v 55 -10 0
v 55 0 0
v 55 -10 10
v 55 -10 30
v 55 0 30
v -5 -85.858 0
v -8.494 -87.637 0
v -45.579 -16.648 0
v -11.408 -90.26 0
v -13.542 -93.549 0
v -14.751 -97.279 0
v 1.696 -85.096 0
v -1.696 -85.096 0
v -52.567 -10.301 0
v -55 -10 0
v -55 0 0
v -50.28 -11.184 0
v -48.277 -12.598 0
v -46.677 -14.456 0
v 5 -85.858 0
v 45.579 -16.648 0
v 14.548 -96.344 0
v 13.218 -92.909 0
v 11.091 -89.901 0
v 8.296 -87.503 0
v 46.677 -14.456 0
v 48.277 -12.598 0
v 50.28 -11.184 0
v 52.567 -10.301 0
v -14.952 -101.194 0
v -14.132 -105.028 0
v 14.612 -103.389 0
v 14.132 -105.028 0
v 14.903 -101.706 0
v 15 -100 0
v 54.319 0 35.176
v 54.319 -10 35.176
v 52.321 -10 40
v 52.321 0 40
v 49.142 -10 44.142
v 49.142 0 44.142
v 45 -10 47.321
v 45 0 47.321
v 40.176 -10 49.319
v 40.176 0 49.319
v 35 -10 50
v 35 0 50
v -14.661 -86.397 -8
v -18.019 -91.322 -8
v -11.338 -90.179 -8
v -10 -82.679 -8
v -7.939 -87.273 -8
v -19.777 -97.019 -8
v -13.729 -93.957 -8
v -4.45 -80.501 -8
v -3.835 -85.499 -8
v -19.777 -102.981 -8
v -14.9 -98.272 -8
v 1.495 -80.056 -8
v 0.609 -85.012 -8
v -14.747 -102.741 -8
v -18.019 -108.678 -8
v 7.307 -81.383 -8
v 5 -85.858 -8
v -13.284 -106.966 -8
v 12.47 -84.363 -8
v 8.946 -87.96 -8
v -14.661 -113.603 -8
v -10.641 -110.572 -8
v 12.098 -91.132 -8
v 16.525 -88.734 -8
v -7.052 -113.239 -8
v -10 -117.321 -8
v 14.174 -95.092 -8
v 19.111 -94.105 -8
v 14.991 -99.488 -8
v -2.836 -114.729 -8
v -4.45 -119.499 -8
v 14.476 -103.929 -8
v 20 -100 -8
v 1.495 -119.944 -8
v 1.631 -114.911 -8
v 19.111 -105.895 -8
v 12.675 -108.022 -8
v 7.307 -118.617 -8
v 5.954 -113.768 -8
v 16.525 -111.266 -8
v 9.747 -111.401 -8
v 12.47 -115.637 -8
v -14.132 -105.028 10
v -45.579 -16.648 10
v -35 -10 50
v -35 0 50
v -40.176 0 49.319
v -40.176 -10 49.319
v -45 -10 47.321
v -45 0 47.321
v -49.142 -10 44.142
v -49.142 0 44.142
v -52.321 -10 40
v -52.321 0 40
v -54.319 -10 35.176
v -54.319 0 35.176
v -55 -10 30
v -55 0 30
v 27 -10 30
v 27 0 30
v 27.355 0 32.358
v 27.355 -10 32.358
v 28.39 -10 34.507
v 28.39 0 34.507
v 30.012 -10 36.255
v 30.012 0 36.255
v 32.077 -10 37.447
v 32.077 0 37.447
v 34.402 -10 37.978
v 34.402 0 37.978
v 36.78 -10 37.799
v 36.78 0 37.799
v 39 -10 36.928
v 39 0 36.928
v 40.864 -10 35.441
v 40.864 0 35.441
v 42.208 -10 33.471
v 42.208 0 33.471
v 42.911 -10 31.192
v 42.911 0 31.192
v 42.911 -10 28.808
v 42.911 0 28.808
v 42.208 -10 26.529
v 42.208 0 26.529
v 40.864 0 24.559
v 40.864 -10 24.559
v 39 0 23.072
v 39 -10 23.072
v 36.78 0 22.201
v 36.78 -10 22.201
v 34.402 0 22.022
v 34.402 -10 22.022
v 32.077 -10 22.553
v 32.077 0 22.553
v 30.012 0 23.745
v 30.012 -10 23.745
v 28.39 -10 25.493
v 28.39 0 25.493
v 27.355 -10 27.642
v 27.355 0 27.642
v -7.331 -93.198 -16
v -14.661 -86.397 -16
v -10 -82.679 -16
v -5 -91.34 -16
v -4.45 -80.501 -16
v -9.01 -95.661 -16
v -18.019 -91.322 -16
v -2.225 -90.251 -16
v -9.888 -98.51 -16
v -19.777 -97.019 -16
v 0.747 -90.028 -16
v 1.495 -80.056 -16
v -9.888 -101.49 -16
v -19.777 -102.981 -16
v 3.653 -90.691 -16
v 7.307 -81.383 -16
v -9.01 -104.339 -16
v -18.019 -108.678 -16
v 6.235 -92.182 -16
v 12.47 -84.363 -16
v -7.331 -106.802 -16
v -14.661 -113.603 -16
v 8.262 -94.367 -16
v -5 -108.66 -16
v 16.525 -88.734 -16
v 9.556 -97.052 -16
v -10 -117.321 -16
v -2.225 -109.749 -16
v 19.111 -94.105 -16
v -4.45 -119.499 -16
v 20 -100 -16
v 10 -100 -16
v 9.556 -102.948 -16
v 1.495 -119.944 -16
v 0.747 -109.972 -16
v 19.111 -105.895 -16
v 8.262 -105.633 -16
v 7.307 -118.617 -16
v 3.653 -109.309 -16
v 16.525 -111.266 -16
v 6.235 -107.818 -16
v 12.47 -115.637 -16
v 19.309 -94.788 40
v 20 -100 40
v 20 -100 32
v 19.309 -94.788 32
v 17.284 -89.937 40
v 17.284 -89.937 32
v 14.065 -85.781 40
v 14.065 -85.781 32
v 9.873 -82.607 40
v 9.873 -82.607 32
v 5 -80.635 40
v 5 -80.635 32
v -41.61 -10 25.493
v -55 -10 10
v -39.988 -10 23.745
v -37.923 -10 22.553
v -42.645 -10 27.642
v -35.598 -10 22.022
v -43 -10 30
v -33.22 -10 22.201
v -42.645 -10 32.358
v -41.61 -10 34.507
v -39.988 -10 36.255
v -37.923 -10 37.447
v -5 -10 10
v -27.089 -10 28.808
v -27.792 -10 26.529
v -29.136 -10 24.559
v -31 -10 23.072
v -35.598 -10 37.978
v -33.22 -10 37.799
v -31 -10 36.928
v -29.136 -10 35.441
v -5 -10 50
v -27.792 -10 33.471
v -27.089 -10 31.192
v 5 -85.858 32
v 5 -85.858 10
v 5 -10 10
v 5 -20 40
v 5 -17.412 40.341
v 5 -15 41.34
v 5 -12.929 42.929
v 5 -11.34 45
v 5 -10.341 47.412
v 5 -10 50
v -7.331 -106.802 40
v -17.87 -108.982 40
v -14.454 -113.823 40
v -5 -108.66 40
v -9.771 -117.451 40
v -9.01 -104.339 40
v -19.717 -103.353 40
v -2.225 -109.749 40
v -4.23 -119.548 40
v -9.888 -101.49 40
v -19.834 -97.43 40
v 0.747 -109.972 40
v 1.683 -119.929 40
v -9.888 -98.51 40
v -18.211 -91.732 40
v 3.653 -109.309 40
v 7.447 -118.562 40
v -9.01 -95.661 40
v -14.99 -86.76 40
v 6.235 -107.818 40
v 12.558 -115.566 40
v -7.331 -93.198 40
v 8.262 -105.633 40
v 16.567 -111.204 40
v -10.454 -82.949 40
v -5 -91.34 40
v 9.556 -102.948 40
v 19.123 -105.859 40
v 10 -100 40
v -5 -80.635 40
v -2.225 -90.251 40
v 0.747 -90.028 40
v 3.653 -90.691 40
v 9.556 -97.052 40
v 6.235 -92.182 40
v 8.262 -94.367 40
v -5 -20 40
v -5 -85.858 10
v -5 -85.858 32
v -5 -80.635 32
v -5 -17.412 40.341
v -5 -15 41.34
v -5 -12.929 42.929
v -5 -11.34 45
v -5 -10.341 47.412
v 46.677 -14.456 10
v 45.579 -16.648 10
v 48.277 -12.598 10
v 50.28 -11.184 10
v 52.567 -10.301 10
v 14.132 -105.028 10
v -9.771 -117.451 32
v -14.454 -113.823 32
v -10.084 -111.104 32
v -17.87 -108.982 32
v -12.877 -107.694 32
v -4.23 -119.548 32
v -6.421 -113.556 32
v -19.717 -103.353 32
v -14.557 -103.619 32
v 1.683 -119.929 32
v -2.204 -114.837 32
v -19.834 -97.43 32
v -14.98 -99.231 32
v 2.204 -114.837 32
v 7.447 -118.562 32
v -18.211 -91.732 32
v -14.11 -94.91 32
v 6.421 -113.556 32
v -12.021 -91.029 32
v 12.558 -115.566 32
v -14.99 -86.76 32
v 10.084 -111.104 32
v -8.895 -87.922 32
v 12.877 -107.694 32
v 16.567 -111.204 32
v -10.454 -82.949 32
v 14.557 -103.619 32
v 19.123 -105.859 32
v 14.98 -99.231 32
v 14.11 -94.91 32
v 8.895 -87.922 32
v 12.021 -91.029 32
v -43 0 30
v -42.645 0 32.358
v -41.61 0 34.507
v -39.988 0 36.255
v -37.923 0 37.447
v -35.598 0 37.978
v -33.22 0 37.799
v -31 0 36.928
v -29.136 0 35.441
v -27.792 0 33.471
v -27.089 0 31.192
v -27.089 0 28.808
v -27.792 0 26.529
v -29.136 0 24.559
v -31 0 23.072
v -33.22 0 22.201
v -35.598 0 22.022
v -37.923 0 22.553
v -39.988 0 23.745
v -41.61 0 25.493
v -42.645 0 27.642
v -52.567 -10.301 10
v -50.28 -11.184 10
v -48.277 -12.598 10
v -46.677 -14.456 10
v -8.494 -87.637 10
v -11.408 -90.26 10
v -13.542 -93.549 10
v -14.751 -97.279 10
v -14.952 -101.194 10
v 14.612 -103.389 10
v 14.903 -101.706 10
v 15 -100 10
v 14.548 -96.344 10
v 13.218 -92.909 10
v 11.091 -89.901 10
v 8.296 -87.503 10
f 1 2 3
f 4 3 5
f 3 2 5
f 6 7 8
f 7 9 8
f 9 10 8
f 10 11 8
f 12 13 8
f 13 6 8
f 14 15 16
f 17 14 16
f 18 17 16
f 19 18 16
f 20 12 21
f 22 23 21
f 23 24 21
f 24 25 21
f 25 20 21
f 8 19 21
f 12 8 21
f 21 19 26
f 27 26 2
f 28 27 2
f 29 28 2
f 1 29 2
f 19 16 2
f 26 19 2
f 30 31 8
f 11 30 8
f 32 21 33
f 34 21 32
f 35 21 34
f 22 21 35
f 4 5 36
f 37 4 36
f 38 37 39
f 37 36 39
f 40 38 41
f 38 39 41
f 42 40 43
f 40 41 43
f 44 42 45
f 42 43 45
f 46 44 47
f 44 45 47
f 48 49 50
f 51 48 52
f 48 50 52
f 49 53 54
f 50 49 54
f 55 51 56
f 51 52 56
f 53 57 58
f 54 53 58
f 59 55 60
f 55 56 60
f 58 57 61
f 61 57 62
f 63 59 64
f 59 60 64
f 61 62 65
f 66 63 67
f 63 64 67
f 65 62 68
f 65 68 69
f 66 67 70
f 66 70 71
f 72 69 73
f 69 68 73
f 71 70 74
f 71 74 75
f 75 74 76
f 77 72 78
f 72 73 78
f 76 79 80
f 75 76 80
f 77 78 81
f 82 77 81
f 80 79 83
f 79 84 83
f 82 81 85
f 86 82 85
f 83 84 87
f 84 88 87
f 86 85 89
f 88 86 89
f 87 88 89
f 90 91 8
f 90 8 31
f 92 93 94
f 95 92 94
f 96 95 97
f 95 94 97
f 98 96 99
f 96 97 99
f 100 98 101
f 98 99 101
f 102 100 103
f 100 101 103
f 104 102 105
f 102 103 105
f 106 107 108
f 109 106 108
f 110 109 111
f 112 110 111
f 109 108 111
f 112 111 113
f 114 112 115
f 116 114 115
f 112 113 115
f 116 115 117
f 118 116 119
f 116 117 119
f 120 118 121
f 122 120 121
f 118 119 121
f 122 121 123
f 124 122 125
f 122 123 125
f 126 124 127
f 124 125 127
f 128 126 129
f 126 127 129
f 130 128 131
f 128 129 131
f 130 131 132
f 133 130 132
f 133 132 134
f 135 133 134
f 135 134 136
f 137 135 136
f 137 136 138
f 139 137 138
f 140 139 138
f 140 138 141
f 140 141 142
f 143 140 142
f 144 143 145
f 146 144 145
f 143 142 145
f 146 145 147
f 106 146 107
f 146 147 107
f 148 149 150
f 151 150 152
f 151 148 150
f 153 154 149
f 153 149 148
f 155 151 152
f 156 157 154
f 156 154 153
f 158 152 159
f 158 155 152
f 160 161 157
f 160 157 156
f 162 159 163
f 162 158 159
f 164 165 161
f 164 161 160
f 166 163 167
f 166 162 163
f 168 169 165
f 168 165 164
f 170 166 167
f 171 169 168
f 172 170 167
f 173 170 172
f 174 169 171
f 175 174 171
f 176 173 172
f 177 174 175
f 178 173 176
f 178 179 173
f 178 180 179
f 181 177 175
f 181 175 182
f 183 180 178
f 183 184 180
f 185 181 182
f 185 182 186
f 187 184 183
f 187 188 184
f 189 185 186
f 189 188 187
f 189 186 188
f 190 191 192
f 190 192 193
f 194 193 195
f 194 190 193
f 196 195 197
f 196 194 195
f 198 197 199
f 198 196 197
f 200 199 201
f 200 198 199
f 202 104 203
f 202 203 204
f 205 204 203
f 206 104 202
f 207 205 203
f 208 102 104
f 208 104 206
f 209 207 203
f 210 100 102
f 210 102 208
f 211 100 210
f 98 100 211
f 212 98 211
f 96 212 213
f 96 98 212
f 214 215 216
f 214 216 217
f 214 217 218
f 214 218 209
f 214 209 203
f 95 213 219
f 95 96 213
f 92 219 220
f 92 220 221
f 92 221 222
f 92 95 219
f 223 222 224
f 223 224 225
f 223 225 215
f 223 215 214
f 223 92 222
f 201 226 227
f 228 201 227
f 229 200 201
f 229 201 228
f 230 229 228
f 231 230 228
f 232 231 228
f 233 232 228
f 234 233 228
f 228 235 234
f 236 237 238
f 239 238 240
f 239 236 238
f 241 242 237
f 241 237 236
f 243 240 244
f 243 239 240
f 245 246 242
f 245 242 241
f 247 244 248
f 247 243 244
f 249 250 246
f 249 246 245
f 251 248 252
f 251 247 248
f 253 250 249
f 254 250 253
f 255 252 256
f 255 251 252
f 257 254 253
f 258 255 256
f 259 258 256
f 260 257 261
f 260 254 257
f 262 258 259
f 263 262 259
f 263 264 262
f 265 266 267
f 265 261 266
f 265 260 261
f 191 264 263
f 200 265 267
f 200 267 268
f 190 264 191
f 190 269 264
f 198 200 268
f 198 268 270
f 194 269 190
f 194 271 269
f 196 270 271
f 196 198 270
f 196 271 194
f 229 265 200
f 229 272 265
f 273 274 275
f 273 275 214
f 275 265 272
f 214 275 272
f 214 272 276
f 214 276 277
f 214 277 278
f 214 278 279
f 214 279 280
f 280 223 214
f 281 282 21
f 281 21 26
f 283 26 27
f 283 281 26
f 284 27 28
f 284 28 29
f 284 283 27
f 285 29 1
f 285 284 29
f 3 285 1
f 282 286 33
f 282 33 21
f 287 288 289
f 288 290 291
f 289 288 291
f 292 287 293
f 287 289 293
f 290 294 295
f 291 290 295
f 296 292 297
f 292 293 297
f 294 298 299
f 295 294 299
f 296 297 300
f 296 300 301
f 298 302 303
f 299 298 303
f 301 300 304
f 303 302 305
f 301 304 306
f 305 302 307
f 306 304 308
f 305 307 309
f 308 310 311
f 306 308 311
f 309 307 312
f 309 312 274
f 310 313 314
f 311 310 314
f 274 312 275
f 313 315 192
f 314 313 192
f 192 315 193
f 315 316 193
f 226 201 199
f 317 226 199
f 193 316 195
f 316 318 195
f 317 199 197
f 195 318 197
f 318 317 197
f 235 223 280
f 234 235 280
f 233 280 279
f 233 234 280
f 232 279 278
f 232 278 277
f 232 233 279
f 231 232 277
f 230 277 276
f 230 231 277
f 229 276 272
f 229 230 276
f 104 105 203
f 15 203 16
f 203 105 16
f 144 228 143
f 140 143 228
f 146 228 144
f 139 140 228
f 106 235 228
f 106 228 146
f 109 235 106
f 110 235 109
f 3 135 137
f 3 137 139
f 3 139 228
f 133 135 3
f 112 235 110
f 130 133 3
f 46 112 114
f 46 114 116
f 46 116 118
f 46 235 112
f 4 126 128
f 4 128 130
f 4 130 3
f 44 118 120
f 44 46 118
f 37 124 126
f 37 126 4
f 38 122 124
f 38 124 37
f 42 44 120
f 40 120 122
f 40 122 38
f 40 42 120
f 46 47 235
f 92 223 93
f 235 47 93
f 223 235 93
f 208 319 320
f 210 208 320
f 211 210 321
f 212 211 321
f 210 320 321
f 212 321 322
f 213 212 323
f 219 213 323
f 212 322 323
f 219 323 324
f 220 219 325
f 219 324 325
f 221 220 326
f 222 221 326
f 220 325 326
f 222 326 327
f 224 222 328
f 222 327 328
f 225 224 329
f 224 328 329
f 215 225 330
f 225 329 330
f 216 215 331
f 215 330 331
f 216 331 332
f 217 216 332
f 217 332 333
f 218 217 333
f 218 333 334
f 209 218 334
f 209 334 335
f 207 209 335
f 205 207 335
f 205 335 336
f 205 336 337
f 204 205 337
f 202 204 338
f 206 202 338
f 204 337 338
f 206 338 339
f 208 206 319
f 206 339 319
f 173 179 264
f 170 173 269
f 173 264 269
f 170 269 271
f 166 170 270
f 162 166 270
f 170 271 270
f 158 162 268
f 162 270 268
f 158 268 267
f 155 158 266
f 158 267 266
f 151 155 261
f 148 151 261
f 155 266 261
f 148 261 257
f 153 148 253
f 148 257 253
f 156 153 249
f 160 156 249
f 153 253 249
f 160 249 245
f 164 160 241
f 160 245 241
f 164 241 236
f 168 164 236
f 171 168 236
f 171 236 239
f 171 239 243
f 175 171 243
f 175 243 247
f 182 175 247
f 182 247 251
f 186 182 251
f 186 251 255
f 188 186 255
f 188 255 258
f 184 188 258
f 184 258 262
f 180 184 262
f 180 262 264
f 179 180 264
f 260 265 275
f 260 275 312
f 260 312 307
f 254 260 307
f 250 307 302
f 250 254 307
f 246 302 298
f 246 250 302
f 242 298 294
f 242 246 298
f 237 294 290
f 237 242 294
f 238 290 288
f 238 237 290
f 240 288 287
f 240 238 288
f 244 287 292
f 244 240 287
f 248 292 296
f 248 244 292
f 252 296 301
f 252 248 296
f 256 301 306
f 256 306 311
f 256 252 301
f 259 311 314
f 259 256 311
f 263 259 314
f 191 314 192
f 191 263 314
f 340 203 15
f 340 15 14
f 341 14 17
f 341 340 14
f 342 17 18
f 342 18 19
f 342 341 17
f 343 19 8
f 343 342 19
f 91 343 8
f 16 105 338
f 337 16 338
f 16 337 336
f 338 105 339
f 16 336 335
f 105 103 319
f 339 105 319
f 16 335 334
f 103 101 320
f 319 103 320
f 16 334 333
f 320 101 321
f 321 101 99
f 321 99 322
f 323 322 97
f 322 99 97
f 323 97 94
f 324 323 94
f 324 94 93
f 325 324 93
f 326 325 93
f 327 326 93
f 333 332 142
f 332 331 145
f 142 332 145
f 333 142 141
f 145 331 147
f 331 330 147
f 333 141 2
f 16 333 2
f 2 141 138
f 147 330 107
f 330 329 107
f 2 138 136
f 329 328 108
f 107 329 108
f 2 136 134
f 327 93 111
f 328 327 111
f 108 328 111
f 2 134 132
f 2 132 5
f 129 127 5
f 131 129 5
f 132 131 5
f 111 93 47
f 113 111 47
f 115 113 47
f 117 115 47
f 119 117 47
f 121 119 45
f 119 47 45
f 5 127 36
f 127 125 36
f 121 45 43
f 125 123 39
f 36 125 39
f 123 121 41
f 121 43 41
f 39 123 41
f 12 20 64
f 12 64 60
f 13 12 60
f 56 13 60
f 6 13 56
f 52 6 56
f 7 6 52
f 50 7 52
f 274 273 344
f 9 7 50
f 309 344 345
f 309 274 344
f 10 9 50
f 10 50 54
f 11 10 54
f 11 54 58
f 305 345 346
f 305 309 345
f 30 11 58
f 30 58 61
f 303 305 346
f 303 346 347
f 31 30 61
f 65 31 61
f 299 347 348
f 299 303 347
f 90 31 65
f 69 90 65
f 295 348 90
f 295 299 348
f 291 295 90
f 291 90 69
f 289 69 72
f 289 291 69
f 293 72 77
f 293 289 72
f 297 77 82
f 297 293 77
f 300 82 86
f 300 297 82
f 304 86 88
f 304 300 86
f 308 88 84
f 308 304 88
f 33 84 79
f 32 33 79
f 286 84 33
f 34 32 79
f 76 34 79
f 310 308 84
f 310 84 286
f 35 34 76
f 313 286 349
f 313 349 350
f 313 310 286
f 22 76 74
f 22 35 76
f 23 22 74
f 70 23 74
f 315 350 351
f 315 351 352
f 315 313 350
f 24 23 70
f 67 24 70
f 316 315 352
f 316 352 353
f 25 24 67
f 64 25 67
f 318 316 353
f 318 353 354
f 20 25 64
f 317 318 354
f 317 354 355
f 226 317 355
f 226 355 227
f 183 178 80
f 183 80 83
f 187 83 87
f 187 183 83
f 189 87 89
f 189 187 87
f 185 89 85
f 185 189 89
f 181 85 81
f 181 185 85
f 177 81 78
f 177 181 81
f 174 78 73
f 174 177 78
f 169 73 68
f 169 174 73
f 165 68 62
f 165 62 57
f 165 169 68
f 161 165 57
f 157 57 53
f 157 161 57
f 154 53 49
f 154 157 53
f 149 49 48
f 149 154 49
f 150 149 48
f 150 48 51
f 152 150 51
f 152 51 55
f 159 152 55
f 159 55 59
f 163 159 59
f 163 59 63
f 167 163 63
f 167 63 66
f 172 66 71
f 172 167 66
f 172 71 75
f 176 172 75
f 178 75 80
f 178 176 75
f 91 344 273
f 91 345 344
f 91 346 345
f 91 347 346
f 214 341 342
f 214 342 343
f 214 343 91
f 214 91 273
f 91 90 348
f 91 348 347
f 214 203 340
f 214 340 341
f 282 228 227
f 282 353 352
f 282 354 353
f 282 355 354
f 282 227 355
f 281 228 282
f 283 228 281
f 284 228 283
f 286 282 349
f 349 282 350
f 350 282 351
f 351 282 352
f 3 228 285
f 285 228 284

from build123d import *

# Parameters (mm, degrees)
F1_DEPTH  = 10
F4_DEPTH  = 10
F6_DEPTH  = 5
F8_DEPTH  = 56
F10_DEPTH = 8
F11_R     = 20
F11_R_2   = 15
F12_DEPTH = 8
F13_R     = 10
F14_DEPTH = 56.001
F15_R     = 8
F16_DEPTH = 10


with BuildPart() as f1:
    # F0 (on Front) → F1 (new body)
    with BuildSketch(Plane.XZ):
        with BuildLine():
            Line((-55, 30), (-55, 0))
            Line((-55, 0), (55, 0))
            Line((55, 0), (55, 30))
            ThreePointArc((55, 30), (49.1421356237, 44.1421356237), (35, 50))
            Line((35, 50), (-35, 50))
            ThreePointArc((-35, 50), (-49.1421356237, 44.1421356237), (-55, 30))
        make_face()
    extrude(amount=F1_DEPTH)

    # F3 (on offset) → F4 (join)
    with BuildSketch(Plane.XY.offset(10)):
        with BuildLine():
            Line((-15.9212083525, -100), (-14.1320931815, -105.0283140623))
            ThreePointArc((-14.1320931815, -105.0283140623), (0, -115), (14.1320931815, -105.0283140623))
            Line((14.1320931815, -105.0283140623), (15.9212083525, -100))
            Line((15.9212083525, -100), (45.5786045457, -16.6477906251))
            ThreePointArc((45.5786045457, -16.6477906251), (49.2346766677, -11.8292566511), (55, -10))
            Line((55, -10), (-55, -10))
            ThreePointArc((-55, -10), (-49.2346766677, -11.8292566511), (-45.5786045457, -16.6477906251))
            Line((-45.5786045457, -16.6477906251), (-15.9212083525, -100))
        make_face()
    extrude(amount=-F4_DEPTH)

    # F5 (on Right) → F6 (join, symmetric)
    with BuildSketch(Plane.YZ):
        with BuildLine():
            Line((-100, 10), (-10, 10))
            Line((-10, 10), (-10, 40))
            Line((-10, 40), (-10, 50))
            ThreePointArc((-10, 50), (-12.9289321881, 42.9289321881), (-20, 40))
            Line((-20, 40), (-100, 40))
            Line((-100, 40), (-100, 10))
        make_face()
    extrude(amount=F6_DEPTH, both=True)

    # F7 (on face) → F8 (join)
    with BuildSketch(Plane.XY.offset(40)):
        with BuildLine():
            Line((5, -100), (5, -85.8578643763))
            ThreePointArc((5, -85.8578643763), (0, -85), (-5, -85.8578643763))
            Line((-5, -85.8578643763), (-5, -100))
            Line((-5, -100), (5, -100))
        make_face()
        with BuildLine():
            ThreePointArc((-5, -85.8578643763), (-8.6602540378, -112.2474487139), (15, -100))
            ThreePointArc((15, -100), (12.2474487139, -91.3397459622), (5, -85.8578643763))
            Line((5, -85.8578643763), (5, -100))
            Line((5, -100), (-5, -100))
            Line((-5, -100), (-5, -85.8578643763))
        make_face()
    extrude(amount=-F8_DEPTH)

    # F9 (on face) → F10 (join)
    with BuildSketch(Plane.XY.offset(40)):
        with BuildLine():
            ThreePointArc((-5, -80.635083269), (-12.2474487139, -115.8113883008), (20, -100))
            ThreePointArc((20, -100), (15.8113883008, -87.7525512861), (5, -80.635083269))
            Line((5, -80.635083269), (5, -85.8578643763))
            ThreePointArc((5, -85.8578643763), (0, -115), (-5, -85.8578643763))
            Line((-5, -85.8578643763), (-5, -80.635083269))
        make_face()
    extrude(amount=-F10_DEPTH)

    # F11 (on face) → F12 (join)
    with BuildSketch(Plane(origin=(0, 0, -16), x_dir=(1, 0, 0), z_dir=(0, 0, -1))):
        with Locations((0, 100)):
            Circle(F11_R)
        with Locations((0, 100)):
            Circle(F11_R_2, mode=Mode.SUBTRACT)
    extrude(amount=-F12_DEPTH)

    # F13 (on face) → F14 (cut, through all)
    with BuildSketch(Plane.XY.offset(40)):
        with Locations((0, -100)):
            Circle(F13_R)
    extrude(amount=-F14_DEPTH, mode=Mode.SUBTRACT)

    # F15 (on face) → F16 (cut, through all)
    with BuildSketch(Plane(origin=(0, 0, 0), x_dir=(-1, 0, 0), z_dir=(0, 1, 0))):
        with Locations((-35, 30)):
            Circle(F15_R)
        with Locations((35, 30)):
            Circle(F15_R)
    extrude(amount=-F16_DEPTH, mode=Mode.SUBTRACT)


solid = f1.part
